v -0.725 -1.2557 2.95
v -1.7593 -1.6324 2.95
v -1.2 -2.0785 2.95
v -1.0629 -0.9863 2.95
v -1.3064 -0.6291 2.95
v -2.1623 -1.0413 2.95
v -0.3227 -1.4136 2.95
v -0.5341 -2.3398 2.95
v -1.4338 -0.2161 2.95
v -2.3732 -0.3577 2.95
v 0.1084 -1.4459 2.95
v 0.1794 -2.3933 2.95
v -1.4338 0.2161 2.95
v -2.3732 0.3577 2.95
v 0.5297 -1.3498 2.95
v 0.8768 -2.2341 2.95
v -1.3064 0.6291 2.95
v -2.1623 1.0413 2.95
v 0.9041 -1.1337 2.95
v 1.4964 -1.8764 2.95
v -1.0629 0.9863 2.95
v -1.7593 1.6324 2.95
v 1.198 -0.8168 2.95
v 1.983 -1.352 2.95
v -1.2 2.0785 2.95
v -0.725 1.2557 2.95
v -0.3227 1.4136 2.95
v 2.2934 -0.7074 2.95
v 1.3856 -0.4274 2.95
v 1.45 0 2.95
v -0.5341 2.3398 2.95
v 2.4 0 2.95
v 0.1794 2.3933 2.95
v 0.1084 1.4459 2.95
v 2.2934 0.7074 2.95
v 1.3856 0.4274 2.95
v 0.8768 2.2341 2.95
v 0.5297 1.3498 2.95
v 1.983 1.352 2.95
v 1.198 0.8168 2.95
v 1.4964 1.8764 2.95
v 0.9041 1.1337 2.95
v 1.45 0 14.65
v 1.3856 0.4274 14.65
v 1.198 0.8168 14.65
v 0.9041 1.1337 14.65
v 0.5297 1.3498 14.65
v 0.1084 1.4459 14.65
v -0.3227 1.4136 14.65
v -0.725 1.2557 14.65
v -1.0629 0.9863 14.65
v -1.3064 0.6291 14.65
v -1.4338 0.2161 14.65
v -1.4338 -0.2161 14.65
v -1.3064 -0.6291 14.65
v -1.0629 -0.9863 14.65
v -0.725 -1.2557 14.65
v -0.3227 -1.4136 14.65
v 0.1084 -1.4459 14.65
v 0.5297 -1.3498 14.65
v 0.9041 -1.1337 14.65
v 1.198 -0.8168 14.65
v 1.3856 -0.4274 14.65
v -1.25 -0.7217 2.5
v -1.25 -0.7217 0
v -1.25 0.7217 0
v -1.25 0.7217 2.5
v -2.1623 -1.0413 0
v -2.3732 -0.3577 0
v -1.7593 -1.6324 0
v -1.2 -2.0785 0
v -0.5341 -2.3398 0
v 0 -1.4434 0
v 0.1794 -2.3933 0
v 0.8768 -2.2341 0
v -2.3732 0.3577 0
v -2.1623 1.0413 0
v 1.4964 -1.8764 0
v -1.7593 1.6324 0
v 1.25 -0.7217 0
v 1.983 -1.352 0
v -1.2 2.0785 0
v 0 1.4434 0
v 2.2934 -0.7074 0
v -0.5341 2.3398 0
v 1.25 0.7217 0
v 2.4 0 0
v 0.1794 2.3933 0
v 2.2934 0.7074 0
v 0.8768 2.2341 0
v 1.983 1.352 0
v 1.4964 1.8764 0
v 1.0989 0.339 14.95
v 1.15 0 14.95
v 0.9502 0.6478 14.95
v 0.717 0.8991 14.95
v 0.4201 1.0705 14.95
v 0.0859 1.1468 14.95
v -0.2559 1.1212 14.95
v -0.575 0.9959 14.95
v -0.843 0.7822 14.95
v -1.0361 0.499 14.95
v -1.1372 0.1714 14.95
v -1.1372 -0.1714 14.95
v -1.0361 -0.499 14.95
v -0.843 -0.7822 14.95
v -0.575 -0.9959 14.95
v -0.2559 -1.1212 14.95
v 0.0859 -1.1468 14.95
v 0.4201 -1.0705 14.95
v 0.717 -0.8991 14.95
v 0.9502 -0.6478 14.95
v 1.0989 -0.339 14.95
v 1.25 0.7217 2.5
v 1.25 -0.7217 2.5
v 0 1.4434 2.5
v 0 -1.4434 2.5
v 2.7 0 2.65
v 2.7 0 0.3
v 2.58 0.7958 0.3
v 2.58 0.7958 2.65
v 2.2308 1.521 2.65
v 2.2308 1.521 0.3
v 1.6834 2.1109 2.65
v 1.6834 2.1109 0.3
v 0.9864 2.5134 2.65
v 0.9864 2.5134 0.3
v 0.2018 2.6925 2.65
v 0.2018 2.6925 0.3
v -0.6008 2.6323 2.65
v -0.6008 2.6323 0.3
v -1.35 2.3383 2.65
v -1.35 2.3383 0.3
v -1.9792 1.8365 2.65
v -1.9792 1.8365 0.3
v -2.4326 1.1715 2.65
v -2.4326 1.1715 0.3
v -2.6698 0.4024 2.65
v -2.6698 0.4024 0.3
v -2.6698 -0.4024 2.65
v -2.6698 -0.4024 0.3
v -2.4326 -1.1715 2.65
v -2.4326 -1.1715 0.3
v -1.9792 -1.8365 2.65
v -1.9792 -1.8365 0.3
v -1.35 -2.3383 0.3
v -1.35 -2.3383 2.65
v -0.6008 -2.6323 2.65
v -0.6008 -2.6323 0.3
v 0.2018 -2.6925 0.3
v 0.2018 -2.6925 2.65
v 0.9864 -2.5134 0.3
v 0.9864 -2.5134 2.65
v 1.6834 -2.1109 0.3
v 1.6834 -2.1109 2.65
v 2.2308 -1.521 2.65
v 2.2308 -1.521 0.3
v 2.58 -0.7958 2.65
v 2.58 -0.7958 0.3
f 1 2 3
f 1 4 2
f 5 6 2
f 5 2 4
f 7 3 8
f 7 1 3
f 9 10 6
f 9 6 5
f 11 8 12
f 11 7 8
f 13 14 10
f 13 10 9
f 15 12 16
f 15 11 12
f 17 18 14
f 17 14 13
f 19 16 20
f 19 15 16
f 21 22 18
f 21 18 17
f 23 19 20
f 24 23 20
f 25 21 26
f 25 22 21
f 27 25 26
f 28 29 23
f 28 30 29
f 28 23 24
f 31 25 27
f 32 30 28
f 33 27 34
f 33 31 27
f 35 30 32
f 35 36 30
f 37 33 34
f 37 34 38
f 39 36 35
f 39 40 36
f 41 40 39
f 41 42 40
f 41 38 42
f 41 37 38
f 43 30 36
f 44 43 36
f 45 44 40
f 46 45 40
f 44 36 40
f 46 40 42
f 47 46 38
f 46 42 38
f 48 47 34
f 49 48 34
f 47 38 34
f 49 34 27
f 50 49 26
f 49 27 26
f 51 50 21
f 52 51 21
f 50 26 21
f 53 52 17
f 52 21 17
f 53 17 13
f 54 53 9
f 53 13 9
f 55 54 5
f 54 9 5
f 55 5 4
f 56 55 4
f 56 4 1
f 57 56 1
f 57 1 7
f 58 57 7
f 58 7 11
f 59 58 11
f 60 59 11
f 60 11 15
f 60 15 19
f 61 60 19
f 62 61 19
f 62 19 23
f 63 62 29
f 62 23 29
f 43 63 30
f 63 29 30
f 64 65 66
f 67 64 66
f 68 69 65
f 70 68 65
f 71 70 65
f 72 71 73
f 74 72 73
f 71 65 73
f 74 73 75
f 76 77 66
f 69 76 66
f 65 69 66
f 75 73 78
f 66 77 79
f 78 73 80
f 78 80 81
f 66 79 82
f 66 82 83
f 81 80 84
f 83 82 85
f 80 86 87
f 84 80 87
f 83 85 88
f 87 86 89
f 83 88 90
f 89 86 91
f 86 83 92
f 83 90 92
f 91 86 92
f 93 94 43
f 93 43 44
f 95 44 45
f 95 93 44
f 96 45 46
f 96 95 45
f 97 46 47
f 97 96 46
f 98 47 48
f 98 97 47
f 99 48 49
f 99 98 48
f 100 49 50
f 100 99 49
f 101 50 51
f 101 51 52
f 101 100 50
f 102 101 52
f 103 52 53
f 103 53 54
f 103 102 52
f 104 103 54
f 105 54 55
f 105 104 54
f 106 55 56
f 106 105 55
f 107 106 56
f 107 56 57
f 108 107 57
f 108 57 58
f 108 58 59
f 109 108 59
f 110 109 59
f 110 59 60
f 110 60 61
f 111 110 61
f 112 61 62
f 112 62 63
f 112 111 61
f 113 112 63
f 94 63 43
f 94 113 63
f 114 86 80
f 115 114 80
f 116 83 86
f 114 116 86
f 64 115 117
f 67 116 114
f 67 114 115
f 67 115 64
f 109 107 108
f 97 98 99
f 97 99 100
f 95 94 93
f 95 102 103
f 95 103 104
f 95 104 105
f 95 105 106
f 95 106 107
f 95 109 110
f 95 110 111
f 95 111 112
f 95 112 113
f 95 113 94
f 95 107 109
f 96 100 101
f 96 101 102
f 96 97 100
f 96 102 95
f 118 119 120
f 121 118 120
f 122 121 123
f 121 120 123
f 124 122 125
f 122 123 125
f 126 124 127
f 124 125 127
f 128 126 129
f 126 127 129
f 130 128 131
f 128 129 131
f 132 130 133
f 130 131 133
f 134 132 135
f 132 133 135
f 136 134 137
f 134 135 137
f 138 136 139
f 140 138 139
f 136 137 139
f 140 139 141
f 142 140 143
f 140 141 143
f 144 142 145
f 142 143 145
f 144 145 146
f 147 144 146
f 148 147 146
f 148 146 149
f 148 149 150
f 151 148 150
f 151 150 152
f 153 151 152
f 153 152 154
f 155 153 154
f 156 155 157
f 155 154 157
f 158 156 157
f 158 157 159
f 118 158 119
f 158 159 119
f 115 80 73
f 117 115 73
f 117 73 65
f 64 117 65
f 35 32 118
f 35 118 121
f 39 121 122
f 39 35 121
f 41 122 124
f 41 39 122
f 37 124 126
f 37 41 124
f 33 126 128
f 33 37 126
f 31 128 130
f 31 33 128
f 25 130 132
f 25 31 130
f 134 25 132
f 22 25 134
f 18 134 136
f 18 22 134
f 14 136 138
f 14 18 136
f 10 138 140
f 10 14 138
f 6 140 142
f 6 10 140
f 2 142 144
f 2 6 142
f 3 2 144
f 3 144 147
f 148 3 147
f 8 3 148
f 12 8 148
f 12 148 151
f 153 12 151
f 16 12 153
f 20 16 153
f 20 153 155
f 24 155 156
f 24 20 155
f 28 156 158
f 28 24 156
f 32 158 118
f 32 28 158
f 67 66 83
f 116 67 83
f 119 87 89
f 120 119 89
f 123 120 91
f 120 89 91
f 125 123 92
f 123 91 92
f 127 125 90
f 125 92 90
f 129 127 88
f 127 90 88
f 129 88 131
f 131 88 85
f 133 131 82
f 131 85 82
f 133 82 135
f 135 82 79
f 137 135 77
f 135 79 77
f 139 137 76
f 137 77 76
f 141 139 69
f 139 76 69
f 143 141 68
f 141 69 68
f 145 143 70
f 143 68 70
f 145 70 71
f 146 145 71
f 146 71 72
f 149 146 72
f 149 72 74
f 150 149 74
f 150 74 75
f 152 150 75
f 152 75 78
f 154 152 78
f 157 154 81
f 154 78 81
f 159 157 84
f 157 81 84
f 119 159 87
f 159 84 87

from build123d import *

# Parameters (mm, degrees)
SKIZZE1_R                       = 2.7
AUFSATZ_LINEAR_AUSTRAGEN1_DEPTH = 2.95
SKIZZE2_R                       = 1.45
AUFSATZ_LINEAR_AUSTRAGEN2_DEPTH = 12
FASE1_SIZE                      = 0.3
SCHNITT_LINEAR_AUSTRAGEN1_DEPTH = 2.5


with BuildPart() as part:
    # Skizze1 → Aufsatz-Linear austragen1 (new body)
    with BuildSketch(Plane.XY):
        Circle(SKIZZE1_R)
    extrude(amount=AUFSATZ_LINEAR_AUSTRAGEN1_DEPTH)

    # Skizze2 → Aufsatz-Linear austragen2 (add)
    with BuildSketch(Plane.XY.offset(2.95)):
        Circle(SKIZZE2_R)
    extrude(amount=AUFSATZ_LINEAR_AUSTRAGEN2_DEPTH)

    # Fase1
    fase1_edges = [part.edges().sort_by_distance(p)[0] for p in [
        (-2.7, 0, 0),
        (-2.7, 0, 2.95),
        (-1.45, 0, 14.95),
    ]]
    chamfer(fase1_edges, length=FASE1_SIZE)

    # Skizze3 → Schnitt-Linear austragen1 (cut)
    with BuildSketch(Plane(origin=(0, 0, 0), x_dir=(-1, 0, 0), z_dir=(0, 0, -1))):
        Polygon((1.25, 0.721687836), (0, 1.443375673), (-1.25, 0.721687836), (-1.25, -0.721687836), (0, -1.443375673), (1.25, -0.721687836), align=None)
    extrude(amount=-SCHNITT_LINEAR_AUSTRAGEN1_DEPTH, mode=Mode.SUBTRACT)


solid = part.part
